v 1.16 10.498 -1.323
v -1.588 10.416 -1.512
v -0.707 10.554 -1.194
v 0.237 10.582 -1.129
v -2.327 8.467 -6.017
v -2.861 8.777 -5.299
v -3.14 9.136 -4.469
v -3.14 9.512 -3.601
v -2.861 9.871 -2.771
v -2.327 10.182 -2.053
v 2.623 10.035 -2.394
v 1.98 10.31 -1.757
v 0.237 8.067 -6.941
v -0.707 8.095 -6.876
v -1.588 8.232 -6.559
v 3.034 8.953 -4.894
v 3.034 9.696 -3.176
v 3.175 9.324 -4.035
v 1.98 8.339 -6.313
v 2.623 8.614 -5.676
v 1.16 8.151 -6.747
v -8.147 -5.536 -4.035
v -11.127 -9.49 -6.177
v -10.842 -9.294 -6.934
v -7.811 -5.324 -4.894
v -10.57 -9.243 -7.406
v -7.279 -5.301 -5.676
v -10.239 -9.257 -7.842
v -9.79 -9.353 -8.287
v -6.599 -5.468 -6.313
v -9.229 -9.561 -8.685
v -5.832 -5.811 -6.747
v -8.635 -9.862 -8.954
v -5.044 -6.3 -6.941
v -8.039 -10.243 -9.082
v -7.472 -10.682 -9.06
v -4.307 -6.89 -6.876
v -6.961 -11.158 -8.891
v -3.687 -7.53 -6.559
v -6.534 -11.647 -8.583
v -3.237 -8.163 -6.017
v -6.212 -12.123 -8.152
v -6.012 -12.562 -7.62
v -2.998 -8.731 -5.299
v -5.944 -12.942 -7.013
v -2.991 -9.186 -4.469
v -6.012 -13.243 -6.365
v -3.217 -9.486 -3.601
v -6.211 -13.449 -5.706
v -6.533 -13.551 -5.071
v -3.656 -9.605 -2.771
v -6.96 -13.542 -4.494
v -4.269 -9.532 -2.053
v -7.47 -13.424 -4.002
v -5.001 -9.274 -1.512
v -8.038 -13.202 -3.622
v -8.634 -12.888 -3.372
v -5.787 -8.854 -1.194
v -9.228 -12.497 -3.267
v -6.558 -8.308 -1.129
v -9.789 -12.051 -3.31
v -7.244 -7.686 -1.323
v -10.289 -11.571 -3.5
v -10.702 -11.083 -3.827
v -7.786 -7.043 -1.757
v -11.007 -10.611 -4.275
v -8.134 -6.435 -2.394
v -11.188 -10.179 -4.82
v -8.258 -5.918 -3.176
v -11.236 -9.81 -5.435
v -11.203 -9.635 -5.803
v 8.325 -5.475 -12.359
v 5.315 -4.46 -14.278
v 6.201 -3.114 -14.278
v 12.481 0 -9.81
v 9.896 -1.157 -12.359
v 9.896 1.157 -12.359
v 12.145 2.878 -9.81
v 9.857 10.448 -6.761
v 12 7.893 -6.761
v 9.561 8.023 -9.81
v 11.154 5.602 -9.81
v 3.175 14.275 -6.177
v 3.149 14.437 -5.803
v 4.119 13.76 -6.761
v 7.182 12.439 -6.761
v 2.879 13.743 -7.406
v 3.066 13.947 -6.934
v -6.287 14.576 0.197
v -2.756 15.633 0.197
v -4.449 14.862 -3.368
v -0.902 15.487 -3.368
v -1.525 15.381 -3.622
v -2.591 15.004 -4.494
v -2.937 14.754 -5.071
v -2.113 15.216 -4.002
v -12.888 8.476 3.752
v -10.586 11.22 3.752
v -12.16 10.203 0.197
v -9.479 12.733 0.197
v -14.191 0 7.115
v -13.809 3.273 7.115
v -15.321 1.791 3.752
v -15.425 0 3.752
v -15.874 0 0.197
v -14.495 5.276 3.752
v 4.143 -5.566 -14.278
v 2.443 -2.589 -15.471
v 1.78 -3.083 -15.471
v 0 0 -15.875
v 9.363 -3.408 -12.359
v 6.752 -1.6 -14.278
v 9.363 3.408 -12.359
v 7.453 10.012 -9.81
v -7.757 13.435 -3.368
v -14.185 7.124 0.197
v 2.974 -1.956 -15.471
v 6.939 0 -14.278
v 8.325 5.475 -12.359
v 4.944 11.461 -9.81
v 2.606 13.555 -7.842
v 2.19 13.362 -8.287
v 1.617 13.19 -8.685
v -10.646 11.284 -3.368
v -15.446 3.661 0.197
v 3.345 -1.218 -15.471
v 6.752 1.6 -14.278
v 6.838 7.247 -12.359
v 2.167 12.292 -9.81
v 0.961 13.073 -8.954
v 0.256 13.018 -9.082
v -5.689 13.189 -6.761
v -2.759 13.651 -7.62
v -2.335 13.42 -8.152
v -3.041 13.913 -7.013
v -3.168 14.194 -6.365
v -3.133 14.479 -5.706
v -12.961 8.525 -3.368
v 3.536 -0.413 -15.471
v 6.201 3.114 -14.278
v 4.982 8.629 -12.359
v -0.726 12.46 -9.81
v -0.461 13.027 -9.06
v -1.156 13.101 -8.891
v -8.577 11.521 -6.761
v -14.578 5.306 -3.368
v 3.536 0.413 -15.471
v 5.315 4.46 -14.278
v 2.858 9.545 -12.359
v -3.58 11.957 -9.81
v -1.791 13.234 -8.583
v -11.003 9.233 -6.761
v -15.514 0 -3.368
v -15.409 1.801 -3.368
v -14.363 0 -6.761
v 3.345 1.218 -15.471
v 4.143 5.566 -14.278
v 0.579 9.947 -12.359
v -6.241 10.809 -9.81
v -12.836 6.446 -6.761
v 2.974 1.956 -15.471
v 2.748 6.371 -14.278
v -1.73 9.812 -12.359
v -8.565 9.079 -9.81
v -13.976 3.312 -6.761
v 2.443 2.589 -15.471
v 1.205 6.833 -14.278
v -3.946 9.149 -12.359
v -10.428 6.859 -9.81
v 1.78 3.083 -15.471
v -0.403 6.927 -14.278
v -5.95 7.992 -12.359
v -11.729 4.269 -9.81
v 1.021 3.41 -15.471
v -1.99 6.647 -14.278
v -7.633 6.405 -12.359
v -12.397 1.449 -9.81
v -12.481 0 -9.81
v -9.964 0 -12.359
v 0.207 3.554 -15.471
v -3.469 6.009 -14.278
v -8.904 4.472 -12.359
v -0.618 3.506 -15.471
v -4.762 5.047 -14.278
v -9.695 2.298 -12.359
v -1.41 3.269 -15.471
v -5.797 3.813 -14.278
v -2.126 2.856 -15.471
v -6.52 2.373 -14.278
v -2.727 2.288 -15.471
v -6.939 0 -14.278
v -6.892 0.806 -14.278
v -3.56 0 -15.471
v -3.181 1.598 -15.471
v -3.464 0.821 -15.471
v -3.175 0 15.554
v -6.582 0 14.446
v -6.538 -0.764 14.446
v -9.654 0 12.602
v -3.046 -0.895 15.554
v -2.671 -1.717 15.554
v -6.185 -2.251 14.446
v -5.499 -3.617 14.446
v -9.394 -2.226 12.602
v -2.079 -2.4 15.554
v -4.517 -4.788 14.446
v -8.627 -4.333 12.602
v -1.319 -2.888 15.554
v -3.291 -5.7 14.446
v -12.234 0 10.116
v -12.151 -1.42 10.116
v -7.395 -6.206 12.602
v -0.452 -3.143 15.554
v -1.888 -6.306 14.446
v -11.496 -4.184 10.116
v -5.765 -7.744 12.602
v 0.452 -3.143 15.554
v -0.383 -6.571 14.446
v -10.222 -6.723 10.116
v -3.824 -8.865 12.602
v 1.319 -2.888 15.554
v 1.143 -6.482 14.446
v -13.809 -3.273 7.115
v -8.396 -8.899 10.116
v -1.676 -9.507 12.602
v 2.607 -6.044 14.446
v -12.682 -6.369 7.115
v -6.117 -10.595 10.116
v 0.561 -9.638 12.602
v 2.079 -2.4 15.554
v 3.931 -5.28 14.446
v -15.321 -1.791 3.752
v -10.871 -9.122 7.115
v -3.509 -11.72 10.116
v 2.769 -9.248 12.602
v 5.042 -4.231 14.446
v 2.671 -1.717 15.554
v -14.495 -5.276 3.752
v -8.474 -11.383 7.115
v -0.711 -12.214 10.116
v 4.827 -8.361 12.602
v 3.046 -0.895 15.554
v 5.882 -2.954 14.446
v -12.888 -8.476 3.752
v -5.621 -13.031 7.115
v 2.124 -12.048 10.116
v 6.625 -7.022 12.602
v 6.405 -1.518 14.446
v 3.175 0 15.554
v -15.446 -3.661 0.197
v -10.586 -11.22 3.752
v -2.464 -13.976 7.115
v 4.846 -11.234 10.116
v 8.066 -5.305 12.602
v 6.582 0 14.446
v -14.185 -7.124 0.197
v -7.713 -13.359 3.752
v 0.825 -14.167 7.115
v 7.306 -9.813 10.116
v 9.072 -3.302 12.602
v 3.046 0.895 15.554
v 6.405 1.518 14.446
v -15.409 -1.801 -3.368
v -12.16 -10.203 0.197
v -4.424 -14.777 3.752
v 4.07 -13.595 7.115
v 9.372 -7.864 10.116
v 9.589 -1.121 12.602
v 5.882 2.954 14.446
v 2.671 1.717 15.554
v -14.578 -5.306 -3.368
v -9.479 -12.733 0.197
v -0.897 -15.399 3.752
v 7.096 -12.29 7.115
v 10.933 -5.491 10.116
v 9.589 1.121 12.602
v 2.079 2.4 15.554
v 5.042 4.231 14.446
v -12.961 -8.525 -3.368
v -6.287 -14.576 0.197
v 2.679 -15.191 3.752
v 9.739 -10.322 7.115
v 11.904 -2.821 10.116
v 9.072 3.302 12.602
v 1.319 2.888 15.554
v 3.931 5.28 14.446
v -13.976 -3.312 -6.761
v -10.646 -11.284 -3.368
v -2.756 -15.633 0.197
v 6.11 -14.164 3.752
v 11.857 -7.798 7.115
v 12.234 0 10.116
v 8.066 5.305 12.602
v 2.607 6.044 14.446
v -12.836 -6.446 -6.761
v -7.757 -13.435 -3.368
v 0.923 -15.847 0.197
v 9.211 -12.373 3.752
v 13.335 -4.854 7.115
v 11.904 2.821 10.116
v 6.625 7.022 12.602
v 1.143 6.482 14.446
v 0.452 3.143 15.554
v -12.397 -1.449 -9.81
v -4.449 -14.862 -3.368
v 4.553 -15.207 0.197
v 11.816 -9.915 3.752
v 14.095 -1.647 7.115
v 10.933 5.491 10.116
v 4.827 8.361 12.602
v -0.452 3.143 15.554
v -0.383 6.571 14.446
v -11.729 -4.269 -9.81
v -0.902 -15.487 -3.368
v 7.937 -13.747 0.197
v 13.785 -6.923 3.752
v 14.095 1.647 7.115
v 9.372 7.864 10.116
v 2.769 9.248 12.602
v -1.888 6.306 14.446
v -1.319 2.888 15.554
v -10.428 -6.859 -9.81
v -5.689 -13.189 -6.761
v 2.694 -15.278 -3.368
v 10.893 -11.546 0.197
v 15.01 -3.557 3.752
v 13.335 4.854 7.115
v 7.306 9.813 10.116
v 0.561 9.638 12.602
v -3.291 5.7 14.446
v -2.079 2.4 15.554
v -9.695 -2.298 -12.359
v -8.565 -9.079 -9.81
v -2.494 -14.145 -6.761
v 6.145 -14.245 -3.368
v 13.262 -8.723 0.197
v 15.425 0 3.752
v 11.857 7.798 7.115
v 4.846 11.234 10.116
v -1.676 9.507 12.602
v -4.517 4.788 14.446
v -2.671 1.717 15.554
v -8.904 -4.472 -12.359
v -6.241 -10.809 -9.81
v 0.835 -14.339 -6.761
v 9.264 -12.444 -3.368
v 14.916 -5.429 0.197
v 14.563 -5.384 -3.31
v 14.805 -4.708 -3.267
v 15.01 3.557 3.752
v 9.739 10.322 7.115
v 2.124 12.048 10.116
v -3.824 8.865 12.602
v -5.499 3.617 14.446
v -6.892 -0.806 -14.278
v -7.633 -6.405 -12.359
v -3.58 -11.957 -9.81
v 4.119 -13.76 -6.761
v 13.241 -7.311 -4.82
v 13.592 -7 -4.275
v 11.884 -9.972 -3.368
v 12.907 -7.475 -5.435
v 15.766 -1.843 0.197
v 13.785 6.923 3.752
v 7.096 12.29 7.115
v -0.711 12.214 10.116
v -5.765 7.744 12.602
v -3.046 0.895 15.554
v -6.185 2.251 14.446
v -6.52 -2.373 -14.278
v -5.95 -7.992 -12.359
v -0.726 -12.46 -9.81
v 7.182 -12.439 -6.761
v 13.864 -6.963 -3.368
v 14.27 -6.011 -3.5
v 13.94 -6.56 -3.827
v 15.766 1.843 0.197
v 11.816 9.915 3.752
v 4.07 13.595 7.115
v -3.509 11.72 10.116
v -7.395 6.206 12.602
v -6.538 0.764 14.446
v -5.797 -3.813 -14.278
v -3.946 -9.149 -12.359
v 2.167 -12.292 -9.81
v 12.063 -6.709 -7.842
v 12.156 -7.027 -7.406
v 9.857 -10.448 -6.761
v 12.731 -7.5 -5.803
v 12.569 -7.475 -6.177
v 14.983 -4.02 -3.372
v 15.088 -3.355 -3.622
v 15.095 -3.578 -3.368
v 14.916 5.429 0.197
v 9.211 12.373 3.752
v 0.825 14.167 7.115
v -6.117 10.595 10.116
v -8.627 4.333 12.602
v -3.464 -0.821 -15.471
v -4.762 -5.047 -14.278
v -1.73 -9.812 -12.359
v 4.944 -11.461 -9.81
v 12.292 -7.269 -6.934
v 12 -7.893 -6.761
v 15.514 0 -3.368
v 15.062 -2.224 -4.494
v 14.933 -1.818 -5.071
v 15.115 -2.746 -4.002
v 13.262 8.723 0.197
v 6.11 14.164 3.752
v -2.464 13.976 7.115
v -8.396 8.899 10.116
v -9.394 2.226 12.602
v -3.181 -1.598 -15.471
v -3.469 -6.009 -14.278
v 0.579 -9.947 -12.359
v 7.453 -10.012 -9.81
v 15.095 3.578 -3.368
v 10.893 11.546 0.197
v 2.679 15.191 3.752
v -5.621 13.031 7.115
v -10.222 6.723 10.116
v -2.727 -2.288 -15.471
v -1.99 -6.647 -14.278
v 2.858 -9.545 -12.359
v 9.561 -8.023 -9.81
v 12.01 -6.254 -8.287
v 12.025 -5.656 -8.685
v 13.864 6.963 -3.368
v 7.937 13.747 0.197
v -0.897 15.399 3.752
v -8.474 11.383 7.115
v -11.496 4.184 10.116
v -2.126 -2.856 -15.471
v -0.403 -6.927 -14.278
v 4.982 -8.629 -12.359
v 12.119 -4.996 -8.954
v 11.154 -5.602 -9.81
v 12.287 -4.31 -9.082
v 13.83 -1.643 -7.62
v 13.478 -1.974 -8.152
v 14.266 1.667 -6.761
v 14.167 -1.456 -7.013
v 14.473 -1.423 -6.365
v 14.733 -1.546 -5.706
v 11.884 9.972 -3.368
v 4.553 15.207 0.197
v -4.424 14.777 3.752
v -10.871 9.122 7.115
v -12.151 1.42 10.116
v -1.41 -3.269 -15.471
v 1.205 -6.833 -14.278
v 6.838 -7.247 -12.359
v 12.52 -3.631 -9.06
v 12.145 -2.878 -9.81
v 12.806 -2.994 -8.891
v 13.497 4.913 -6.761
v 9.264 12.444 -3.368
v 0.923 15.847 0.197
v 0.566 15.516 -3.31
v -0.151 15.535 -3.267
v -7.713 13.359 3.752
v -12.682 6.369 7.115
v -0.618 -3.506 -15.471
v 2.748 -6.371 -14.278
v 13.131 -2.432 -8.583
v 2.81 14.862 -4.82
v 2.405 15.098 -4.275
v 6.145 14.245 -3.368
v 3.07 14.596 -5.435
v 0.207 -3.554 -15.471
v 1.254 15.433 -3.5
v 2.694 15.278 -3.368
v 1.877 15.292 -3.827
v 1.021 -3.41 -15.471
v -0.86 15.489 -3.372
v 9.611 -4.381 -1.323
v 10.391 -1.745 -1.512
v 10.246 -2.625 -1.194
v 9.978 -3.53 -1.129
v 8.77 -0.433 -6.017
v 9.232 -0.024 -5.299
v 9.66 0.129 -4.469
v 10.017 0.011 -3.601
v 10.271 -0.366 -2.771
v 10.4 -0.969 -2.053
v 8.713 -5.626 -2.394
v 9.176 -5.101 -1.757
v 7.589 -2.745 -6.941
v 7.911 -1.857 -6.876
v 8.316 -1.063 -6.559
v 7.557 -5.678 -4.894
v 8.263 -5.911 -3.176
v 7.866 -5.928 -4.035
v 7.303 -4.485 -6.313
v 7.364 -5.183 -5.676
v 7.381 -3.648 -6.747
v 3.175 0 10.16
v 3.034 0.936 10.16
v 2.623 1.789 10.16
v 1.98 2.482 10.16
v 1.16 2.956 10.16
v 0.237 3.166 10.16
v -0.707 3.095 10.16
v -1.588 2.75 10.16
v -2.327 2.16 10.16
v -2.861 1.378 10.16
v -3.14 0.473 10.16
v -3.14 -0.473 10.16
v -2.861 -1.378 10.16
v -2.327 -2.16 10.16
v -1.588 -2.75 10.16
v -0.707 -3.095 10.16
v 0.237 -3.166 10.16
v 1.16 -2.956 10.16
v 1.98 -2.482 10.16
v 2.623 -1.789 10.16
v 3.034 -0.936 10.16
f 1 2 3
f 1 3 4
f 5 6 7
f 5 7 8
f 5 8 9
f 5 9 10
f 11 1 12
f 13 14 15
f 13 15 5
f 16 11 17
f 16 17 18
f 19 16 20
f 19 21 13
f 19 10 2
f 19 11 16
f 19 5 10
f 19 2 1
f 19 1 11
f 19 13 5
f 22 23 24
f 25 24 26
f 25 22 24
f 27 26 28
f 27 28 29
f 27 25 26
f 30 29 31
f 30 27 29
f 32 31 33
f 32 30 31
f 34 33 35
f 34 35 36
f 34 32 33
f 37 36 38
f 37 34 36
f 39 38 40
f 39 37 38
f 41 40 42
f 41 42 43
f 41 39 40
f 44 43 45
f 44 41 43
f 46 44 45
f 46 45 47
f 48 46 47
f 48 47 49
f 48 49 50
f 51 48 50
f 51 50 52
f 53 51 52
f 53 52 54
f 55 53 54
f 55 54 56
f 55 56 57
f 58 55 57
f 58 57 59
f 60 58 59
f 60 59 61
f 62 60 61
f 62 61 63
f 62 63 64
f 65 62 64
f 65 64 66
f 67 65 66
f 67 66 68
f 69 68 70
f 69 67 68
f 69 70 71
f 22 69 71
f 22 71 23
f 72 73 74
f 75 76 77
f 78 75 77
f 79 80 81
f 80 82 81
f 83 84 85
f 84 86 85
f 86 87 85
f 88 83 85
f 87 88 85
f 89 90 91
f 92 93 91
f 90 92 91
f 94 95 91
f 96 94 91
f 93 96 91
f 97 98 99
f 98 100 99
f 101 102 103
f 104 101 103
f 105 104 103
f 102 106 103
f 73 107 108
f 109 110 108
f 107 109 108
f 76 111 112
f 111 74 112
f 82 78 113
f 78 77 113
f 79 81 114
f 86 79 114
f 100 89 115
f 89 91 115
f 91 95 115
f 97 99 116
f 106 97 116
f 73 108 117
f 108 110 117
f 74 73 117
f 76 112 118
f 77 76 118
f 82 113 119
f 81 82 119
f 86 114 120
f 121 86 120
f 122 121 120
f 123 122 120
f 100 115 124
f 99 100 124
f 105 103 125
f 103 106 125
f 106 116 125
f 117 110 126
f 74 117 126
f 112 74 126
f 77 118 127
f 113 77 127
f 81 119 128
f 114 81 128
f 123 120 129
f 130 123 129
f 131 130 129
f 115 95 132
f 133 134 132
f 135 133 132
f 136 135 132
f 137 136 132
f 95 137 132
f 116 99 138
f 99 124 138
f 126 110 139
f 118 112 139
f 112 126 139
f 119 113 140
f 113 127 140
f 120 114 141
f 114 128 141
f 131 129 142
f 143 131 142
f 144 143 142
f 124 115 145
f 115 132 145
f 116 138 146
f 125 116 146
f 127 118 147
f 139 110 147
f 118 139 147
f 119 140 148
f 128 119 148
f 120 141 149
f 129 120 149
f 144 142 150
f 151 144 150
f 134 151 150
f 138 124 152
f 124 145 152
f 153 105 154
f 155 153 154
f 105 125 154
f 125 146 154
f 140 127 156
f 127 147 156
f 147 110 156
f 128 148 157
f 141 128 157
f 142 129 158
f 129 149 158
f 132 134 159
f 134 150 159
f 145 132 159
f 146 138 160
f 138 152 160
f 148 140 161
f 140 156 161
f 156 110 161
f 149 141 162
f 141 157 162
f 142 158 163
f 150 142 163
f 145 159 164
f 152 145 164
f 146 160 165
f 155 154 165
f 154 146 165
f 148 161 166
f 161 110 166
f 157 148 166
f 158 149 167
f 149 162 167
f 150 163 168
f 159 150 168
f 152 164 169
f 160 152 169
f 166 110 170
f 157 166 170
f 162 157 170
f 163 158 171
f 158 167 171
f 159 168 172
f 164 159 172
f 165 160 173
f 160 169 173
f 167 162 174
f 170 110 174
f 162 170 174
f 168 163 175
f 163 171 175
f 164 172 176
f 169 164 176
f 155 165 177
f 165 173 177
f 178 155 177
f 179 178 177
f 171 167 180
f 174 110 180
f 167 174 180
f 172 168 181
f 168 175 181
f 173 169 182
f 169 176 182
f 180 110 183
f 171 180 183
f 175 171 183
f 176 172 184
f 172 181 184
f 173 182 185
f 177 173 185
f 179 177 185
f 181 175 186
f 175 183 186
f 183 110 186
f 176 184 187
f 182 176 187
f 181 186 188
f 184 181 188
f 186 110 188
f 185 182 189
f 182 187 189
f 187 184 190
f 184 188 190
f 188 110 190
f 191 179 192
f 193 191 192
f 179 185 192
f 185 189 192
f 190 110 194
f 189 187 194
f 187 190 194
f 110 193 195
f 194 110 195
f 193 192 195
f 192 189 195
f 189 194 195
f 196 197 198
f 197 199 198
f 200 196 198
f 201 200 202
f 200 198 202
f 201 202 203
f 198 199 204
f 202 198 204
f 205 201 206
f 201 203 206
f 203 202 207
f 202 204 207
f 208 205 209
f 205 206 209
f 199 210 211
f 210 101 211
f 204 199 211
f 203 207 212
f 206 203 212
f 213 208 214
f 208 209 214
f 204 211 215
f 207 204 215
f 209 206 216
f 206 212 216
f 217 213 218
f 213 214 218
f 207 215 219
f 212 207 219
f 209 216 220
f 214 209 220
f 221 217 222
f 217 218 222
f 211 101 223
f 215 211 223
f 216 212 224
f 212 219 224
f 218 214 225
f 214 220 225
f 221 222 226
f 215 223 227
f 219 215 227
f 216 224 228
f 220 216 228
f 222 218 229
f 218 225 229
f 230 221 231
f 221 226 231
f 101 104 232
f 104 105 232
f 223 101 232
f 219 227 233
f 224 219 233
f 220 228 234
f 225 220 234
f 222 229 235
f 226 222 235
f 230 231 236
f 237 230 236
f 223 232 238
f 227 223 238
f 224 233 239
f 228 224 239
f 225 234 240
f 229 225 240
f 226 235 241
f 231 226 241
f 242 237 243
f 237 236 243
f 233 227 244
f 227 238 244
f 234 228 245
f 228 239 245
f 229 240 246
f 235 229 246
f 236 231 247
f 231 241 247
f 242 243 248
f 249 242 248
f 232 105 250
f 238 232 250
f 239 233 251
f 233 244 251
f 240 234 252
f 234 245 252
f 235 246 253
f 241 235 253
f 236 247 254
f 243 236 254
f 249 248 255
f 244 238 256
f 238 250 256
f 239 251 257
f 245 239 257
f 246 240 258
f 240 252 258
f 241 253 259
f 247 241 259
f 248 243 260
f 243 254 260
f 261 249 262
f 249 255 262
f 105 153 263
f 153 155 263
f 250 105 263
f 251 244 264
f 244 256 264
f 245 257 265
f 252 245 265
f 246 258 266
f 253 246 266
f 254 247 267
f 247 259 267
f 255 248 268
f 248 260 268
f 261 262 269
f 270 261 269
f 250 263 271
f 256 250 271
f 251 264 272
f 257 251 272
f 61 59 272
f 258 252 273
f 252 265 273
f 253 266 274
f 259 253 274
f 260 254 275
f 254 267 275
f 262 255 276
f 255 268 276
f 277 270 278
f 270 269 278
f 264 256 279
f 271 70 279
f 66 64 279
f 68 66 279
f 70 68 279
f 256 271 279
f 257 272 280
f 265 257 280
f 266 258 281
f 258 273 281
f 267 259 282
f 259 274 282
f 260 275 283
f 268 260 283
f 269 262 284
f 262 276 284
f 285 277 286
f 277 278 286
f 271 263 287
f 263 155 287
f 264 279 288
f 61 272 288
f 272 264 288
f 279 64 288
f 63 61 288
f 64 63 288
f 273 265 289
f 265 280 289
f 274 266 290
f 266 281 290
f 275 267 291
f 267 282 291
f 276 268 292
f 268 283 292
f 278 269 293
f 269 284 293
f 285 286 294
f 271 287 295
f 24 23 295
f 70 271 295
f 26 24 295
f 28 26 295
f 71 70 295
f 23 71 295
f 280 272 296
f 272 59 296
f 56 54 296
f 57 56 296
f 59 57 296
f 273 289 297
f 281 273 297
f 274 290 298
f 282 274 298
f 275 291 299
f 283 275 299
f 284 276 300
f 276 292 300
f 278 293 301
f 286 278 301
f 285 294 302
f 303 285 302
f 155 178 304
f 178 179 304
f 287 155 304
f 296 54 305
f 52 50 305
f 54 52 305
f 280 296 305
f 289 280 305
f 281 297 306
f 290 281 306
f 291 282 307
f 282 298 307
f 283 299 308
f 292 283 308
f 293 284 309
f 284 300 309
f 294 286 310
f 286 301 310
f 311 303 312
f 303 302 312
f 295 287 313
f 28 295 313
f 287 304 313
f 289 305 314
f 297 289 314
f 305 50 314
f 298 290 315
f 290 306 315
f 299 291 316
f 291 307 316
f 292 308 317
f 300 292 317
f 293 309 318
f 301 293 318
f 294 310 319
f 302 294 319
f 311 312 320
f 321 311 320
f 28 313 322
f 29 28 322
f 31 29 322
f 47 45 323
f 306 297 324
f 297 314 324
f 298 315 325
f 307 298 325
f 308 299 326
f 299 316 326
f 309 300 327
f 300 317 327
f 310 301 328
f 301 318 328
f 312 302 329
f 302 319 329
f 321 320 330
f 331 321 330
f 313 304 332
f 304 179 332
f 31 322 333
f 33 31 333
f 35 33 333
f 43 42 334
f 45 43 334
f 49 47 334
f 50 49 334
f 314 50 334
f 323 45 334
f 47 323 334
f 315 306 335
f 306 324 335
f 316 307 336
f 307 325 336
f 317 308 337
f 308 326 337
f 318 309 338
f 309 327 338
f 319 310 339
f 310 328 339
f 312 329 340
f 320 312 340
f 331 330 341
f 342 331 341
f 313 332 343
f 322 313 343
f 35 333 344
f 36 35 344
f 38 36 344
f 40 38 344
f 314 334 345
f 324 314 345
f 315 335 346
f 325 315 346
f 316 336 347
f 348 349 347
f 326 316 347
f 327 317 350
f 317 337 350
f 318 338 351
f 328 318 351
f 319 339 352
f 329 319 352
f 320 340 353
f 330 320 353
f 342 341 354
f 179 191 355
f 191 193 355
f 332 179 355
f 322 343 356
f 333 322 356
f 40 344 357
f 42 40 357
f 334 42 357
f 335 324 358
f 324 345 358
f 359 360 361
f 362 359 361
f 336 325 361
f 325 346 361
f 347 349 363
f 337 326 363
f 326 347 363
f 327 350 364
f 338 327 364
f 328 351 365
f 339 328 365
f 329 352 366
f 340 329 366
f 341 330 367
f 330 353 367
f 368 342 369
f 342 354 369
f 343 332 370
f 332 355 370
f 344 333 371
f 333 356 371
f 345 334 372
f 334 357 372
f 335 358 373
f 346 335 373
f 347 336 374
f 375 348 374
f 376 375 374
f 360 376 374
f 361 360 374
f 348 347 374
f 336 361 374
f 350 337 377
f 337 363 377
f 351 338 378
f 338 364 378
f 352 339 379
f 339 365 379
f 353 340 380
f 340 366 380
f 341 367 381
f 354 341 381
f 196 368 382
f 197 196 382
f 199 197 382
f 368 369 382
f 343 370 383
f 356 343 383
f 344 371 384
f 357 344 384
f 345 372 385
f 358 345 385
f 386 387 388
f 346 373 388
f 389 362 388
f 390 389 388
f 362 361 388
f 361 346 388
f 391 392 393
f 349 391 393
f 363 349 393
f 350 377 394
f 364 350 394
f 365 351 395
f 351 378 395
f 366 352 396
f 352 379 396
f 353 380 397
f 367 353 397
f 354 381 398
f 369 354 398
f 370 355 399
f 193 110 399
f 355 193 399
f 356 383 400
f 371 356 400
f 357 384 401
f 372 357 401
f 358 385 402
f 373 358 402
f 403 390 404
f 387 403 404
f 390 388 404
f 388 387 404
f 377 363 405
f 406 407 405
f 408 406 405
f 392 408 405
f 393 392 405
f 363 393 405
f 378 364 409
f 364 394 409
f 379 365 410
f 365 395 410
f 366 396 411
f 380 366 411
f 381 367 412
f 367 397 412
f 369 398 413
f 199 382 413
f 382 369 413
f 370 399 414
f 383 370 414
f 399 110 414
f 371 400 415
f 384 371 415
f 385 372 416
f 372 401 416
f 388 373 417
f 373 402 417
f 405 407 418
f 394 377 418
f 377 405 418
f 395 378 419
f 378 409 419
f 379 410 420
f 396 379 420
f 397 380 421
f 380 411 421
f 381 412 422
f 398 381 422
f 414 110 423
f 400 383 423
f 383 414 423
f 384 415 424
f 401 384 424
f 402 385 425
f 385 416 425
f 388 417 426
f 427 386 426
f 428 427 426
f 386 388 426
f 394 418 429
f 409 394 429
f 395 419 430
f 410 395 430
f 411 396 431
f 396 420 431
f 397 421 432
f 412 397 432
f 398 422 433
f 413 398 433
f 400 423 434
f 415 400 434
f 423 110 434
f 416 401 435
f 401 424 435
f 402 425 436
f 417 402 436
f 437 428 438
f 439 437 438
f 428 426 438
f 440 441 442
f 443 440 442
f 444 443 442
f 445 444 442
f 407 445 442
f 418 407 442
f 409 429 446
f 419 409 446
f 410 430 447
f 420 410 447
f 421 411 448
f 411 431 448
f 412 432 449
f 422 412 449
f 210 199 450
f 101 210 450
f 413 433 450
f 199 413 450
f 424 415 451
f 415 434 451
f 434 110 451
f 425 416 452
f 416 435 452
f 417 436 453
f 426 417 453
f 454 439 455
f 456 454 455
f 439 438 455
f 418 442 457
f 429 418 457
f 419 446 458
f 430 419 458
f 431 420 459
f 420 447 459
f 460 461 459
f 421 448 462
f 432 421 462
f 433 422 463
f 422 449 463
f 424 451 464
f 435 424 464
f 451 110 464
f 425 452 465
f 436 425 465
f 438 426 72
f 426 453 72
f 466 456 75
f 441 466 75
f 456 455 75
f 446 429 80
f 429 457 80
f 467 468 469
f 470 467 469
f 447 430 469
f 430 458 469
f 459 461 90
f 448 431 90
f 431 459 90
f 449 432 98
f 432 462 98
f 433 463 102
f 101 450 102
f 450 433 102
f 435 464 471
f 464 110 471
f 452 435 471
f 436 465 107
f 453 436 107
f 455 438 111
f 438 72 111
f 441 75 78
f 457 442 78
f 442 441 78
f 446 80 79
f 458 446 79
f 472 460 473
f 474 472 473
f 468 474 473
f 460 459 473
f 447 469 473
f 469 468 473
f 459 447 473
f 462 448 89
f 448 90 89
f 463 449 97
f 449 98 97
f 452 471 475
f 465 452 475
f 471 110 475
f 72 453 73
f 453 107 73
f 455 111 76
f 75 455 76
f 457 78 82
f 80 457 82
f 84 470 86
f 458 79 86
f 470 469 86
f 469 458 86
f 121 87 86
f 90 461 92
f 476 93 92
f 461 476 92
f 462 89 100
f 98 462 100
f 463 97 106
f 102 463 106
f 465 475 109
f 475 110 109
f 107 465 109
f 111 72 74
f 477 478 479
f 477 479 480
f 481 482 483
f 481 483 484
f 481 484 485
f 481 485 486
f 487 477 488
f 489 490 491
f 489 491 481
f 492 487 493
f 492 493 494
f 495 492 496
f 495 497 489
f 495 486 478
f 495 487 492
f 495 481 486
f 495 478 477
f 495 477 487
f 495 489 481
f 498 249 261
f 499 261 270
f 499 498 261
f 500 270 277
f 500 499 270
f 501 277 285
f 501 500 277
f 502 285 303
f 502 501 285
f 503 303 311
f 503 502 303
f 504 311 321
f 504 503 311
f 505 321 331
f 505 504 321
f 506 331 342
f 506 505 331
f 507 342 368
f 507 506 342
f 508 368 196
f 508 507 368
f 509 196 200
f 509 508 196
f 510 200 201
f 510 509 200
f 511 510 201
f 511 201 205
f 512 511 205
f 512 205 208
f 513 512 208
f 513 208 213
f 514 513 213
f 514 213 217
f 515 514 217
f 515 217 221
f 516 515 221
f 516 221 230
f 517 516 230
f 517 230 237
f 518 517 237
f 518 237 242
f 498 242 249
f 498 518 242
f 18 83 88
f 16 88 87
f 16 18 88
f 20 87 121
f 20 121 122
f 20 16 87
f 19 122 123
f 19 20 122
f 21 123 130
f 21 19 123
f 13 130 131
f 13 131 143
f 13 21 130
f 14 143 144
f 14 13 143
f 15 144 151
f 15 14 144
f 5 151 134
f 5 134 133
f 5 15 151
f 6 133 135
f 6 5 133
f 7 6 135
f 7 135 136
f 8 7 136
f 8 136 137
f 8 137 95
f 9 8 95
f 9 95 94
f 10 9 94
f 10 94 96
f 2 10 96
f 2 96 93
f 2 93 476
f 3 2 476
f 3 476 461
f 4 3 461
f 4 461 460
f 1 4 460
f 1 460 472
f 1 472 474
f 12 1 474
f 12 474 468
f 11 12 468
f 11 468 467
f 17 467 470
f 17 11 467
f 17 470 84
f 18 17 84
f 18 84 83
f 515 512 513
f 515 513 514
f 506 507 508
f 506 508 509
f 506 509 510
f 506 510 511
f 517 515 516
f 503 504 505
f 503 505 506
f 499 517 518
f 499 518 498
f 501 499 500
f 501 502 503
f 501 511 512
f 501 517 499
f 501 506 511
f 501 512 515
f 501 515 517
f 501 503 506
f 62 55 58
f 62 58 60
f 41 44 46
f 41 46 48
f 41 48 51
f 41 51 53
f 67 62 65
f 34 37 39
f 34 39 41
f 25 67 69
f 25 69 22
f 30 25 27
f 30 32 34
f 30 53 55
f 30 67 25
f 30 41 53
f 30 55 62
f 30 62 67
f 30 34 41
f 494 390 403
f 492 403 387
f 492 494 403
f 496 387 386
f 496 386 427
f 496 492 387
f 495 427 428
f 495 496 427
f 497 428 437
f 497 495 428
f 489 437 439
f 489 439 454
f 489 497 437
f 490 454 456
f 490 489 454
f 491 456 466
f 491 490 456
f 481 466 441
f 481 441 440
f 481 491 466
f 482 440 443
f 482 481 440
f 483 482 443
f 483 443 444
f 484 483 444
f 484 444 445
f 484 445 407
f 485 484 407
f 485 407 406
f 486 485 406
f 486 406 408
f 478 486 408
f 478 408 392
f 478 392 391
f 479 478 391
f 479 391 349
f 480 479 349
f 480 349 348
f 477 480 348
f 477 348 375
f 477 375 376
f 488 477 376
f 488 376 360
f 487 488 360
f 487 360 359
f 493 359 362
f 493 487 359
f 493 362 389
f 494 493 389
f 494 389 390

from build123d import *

# Parameters (mm, degrees)
F4_R     = 3.175
F5_DEPTH = 50.8
F7_ANGLE = 113.4
F8_ANGLE = 108.2
F9_ANGLE = 108.8


with BuildPart() as f2:
    # F0 (on Front) → F2 (revolve)
    with BuildSketch(Plane.XZ):
        with BuildLine():
            Line((0, -15.875), (0, 15.875))
            ThreePointArc((0, 15.875), (-15.875, 0), (0, -15.875))
        make_face()
    revolve(axis=Axis((0, 0, 0), (0, 0, 1)))


with BuildPart() as f5:
    # F4 (on offset) → F5 (new body)
    with BuildSketch(Plane.XY.offset(10.16)):
        Circle(F4_R)
    extrude(amount=F5_DEPTH)


with BuildPart() as f7_1:
    # F7: copy of F5
    add(f5.part.rotate(Axis((-36.3165959716, 0, 0), (-1, 0, 0)), F7_ANGLE))


with BuildPart() as f8_1:
    # F8: copy of F7_1
    add(f7_1.part.rotate(Axis((0, 0, -29.0343631059), (0, 0, -1)), F8_ANGLE))


with BuildPart() as f9_1:
    # F9: copy of F8_1
    add(f8_1.part.rotate(Axis((0, 0, -29.0343631059), (0, 0, -1)), F9_ANGLE))


with BuildPart() as f2_1:
    add(f2.part)

    # F10: cut F5, F7_1, F9_1, F8_1
    add(f5.part, mode=Mode.SUBTRACT)
    add(f7_1.part, mode=Mode.SUBTRACT)
    add(f9_1.part, mode=Mode.SUBTRACT)
    add(f8_1.part, mode=Mode.SUBTRACT)


solid = f2_1.part
